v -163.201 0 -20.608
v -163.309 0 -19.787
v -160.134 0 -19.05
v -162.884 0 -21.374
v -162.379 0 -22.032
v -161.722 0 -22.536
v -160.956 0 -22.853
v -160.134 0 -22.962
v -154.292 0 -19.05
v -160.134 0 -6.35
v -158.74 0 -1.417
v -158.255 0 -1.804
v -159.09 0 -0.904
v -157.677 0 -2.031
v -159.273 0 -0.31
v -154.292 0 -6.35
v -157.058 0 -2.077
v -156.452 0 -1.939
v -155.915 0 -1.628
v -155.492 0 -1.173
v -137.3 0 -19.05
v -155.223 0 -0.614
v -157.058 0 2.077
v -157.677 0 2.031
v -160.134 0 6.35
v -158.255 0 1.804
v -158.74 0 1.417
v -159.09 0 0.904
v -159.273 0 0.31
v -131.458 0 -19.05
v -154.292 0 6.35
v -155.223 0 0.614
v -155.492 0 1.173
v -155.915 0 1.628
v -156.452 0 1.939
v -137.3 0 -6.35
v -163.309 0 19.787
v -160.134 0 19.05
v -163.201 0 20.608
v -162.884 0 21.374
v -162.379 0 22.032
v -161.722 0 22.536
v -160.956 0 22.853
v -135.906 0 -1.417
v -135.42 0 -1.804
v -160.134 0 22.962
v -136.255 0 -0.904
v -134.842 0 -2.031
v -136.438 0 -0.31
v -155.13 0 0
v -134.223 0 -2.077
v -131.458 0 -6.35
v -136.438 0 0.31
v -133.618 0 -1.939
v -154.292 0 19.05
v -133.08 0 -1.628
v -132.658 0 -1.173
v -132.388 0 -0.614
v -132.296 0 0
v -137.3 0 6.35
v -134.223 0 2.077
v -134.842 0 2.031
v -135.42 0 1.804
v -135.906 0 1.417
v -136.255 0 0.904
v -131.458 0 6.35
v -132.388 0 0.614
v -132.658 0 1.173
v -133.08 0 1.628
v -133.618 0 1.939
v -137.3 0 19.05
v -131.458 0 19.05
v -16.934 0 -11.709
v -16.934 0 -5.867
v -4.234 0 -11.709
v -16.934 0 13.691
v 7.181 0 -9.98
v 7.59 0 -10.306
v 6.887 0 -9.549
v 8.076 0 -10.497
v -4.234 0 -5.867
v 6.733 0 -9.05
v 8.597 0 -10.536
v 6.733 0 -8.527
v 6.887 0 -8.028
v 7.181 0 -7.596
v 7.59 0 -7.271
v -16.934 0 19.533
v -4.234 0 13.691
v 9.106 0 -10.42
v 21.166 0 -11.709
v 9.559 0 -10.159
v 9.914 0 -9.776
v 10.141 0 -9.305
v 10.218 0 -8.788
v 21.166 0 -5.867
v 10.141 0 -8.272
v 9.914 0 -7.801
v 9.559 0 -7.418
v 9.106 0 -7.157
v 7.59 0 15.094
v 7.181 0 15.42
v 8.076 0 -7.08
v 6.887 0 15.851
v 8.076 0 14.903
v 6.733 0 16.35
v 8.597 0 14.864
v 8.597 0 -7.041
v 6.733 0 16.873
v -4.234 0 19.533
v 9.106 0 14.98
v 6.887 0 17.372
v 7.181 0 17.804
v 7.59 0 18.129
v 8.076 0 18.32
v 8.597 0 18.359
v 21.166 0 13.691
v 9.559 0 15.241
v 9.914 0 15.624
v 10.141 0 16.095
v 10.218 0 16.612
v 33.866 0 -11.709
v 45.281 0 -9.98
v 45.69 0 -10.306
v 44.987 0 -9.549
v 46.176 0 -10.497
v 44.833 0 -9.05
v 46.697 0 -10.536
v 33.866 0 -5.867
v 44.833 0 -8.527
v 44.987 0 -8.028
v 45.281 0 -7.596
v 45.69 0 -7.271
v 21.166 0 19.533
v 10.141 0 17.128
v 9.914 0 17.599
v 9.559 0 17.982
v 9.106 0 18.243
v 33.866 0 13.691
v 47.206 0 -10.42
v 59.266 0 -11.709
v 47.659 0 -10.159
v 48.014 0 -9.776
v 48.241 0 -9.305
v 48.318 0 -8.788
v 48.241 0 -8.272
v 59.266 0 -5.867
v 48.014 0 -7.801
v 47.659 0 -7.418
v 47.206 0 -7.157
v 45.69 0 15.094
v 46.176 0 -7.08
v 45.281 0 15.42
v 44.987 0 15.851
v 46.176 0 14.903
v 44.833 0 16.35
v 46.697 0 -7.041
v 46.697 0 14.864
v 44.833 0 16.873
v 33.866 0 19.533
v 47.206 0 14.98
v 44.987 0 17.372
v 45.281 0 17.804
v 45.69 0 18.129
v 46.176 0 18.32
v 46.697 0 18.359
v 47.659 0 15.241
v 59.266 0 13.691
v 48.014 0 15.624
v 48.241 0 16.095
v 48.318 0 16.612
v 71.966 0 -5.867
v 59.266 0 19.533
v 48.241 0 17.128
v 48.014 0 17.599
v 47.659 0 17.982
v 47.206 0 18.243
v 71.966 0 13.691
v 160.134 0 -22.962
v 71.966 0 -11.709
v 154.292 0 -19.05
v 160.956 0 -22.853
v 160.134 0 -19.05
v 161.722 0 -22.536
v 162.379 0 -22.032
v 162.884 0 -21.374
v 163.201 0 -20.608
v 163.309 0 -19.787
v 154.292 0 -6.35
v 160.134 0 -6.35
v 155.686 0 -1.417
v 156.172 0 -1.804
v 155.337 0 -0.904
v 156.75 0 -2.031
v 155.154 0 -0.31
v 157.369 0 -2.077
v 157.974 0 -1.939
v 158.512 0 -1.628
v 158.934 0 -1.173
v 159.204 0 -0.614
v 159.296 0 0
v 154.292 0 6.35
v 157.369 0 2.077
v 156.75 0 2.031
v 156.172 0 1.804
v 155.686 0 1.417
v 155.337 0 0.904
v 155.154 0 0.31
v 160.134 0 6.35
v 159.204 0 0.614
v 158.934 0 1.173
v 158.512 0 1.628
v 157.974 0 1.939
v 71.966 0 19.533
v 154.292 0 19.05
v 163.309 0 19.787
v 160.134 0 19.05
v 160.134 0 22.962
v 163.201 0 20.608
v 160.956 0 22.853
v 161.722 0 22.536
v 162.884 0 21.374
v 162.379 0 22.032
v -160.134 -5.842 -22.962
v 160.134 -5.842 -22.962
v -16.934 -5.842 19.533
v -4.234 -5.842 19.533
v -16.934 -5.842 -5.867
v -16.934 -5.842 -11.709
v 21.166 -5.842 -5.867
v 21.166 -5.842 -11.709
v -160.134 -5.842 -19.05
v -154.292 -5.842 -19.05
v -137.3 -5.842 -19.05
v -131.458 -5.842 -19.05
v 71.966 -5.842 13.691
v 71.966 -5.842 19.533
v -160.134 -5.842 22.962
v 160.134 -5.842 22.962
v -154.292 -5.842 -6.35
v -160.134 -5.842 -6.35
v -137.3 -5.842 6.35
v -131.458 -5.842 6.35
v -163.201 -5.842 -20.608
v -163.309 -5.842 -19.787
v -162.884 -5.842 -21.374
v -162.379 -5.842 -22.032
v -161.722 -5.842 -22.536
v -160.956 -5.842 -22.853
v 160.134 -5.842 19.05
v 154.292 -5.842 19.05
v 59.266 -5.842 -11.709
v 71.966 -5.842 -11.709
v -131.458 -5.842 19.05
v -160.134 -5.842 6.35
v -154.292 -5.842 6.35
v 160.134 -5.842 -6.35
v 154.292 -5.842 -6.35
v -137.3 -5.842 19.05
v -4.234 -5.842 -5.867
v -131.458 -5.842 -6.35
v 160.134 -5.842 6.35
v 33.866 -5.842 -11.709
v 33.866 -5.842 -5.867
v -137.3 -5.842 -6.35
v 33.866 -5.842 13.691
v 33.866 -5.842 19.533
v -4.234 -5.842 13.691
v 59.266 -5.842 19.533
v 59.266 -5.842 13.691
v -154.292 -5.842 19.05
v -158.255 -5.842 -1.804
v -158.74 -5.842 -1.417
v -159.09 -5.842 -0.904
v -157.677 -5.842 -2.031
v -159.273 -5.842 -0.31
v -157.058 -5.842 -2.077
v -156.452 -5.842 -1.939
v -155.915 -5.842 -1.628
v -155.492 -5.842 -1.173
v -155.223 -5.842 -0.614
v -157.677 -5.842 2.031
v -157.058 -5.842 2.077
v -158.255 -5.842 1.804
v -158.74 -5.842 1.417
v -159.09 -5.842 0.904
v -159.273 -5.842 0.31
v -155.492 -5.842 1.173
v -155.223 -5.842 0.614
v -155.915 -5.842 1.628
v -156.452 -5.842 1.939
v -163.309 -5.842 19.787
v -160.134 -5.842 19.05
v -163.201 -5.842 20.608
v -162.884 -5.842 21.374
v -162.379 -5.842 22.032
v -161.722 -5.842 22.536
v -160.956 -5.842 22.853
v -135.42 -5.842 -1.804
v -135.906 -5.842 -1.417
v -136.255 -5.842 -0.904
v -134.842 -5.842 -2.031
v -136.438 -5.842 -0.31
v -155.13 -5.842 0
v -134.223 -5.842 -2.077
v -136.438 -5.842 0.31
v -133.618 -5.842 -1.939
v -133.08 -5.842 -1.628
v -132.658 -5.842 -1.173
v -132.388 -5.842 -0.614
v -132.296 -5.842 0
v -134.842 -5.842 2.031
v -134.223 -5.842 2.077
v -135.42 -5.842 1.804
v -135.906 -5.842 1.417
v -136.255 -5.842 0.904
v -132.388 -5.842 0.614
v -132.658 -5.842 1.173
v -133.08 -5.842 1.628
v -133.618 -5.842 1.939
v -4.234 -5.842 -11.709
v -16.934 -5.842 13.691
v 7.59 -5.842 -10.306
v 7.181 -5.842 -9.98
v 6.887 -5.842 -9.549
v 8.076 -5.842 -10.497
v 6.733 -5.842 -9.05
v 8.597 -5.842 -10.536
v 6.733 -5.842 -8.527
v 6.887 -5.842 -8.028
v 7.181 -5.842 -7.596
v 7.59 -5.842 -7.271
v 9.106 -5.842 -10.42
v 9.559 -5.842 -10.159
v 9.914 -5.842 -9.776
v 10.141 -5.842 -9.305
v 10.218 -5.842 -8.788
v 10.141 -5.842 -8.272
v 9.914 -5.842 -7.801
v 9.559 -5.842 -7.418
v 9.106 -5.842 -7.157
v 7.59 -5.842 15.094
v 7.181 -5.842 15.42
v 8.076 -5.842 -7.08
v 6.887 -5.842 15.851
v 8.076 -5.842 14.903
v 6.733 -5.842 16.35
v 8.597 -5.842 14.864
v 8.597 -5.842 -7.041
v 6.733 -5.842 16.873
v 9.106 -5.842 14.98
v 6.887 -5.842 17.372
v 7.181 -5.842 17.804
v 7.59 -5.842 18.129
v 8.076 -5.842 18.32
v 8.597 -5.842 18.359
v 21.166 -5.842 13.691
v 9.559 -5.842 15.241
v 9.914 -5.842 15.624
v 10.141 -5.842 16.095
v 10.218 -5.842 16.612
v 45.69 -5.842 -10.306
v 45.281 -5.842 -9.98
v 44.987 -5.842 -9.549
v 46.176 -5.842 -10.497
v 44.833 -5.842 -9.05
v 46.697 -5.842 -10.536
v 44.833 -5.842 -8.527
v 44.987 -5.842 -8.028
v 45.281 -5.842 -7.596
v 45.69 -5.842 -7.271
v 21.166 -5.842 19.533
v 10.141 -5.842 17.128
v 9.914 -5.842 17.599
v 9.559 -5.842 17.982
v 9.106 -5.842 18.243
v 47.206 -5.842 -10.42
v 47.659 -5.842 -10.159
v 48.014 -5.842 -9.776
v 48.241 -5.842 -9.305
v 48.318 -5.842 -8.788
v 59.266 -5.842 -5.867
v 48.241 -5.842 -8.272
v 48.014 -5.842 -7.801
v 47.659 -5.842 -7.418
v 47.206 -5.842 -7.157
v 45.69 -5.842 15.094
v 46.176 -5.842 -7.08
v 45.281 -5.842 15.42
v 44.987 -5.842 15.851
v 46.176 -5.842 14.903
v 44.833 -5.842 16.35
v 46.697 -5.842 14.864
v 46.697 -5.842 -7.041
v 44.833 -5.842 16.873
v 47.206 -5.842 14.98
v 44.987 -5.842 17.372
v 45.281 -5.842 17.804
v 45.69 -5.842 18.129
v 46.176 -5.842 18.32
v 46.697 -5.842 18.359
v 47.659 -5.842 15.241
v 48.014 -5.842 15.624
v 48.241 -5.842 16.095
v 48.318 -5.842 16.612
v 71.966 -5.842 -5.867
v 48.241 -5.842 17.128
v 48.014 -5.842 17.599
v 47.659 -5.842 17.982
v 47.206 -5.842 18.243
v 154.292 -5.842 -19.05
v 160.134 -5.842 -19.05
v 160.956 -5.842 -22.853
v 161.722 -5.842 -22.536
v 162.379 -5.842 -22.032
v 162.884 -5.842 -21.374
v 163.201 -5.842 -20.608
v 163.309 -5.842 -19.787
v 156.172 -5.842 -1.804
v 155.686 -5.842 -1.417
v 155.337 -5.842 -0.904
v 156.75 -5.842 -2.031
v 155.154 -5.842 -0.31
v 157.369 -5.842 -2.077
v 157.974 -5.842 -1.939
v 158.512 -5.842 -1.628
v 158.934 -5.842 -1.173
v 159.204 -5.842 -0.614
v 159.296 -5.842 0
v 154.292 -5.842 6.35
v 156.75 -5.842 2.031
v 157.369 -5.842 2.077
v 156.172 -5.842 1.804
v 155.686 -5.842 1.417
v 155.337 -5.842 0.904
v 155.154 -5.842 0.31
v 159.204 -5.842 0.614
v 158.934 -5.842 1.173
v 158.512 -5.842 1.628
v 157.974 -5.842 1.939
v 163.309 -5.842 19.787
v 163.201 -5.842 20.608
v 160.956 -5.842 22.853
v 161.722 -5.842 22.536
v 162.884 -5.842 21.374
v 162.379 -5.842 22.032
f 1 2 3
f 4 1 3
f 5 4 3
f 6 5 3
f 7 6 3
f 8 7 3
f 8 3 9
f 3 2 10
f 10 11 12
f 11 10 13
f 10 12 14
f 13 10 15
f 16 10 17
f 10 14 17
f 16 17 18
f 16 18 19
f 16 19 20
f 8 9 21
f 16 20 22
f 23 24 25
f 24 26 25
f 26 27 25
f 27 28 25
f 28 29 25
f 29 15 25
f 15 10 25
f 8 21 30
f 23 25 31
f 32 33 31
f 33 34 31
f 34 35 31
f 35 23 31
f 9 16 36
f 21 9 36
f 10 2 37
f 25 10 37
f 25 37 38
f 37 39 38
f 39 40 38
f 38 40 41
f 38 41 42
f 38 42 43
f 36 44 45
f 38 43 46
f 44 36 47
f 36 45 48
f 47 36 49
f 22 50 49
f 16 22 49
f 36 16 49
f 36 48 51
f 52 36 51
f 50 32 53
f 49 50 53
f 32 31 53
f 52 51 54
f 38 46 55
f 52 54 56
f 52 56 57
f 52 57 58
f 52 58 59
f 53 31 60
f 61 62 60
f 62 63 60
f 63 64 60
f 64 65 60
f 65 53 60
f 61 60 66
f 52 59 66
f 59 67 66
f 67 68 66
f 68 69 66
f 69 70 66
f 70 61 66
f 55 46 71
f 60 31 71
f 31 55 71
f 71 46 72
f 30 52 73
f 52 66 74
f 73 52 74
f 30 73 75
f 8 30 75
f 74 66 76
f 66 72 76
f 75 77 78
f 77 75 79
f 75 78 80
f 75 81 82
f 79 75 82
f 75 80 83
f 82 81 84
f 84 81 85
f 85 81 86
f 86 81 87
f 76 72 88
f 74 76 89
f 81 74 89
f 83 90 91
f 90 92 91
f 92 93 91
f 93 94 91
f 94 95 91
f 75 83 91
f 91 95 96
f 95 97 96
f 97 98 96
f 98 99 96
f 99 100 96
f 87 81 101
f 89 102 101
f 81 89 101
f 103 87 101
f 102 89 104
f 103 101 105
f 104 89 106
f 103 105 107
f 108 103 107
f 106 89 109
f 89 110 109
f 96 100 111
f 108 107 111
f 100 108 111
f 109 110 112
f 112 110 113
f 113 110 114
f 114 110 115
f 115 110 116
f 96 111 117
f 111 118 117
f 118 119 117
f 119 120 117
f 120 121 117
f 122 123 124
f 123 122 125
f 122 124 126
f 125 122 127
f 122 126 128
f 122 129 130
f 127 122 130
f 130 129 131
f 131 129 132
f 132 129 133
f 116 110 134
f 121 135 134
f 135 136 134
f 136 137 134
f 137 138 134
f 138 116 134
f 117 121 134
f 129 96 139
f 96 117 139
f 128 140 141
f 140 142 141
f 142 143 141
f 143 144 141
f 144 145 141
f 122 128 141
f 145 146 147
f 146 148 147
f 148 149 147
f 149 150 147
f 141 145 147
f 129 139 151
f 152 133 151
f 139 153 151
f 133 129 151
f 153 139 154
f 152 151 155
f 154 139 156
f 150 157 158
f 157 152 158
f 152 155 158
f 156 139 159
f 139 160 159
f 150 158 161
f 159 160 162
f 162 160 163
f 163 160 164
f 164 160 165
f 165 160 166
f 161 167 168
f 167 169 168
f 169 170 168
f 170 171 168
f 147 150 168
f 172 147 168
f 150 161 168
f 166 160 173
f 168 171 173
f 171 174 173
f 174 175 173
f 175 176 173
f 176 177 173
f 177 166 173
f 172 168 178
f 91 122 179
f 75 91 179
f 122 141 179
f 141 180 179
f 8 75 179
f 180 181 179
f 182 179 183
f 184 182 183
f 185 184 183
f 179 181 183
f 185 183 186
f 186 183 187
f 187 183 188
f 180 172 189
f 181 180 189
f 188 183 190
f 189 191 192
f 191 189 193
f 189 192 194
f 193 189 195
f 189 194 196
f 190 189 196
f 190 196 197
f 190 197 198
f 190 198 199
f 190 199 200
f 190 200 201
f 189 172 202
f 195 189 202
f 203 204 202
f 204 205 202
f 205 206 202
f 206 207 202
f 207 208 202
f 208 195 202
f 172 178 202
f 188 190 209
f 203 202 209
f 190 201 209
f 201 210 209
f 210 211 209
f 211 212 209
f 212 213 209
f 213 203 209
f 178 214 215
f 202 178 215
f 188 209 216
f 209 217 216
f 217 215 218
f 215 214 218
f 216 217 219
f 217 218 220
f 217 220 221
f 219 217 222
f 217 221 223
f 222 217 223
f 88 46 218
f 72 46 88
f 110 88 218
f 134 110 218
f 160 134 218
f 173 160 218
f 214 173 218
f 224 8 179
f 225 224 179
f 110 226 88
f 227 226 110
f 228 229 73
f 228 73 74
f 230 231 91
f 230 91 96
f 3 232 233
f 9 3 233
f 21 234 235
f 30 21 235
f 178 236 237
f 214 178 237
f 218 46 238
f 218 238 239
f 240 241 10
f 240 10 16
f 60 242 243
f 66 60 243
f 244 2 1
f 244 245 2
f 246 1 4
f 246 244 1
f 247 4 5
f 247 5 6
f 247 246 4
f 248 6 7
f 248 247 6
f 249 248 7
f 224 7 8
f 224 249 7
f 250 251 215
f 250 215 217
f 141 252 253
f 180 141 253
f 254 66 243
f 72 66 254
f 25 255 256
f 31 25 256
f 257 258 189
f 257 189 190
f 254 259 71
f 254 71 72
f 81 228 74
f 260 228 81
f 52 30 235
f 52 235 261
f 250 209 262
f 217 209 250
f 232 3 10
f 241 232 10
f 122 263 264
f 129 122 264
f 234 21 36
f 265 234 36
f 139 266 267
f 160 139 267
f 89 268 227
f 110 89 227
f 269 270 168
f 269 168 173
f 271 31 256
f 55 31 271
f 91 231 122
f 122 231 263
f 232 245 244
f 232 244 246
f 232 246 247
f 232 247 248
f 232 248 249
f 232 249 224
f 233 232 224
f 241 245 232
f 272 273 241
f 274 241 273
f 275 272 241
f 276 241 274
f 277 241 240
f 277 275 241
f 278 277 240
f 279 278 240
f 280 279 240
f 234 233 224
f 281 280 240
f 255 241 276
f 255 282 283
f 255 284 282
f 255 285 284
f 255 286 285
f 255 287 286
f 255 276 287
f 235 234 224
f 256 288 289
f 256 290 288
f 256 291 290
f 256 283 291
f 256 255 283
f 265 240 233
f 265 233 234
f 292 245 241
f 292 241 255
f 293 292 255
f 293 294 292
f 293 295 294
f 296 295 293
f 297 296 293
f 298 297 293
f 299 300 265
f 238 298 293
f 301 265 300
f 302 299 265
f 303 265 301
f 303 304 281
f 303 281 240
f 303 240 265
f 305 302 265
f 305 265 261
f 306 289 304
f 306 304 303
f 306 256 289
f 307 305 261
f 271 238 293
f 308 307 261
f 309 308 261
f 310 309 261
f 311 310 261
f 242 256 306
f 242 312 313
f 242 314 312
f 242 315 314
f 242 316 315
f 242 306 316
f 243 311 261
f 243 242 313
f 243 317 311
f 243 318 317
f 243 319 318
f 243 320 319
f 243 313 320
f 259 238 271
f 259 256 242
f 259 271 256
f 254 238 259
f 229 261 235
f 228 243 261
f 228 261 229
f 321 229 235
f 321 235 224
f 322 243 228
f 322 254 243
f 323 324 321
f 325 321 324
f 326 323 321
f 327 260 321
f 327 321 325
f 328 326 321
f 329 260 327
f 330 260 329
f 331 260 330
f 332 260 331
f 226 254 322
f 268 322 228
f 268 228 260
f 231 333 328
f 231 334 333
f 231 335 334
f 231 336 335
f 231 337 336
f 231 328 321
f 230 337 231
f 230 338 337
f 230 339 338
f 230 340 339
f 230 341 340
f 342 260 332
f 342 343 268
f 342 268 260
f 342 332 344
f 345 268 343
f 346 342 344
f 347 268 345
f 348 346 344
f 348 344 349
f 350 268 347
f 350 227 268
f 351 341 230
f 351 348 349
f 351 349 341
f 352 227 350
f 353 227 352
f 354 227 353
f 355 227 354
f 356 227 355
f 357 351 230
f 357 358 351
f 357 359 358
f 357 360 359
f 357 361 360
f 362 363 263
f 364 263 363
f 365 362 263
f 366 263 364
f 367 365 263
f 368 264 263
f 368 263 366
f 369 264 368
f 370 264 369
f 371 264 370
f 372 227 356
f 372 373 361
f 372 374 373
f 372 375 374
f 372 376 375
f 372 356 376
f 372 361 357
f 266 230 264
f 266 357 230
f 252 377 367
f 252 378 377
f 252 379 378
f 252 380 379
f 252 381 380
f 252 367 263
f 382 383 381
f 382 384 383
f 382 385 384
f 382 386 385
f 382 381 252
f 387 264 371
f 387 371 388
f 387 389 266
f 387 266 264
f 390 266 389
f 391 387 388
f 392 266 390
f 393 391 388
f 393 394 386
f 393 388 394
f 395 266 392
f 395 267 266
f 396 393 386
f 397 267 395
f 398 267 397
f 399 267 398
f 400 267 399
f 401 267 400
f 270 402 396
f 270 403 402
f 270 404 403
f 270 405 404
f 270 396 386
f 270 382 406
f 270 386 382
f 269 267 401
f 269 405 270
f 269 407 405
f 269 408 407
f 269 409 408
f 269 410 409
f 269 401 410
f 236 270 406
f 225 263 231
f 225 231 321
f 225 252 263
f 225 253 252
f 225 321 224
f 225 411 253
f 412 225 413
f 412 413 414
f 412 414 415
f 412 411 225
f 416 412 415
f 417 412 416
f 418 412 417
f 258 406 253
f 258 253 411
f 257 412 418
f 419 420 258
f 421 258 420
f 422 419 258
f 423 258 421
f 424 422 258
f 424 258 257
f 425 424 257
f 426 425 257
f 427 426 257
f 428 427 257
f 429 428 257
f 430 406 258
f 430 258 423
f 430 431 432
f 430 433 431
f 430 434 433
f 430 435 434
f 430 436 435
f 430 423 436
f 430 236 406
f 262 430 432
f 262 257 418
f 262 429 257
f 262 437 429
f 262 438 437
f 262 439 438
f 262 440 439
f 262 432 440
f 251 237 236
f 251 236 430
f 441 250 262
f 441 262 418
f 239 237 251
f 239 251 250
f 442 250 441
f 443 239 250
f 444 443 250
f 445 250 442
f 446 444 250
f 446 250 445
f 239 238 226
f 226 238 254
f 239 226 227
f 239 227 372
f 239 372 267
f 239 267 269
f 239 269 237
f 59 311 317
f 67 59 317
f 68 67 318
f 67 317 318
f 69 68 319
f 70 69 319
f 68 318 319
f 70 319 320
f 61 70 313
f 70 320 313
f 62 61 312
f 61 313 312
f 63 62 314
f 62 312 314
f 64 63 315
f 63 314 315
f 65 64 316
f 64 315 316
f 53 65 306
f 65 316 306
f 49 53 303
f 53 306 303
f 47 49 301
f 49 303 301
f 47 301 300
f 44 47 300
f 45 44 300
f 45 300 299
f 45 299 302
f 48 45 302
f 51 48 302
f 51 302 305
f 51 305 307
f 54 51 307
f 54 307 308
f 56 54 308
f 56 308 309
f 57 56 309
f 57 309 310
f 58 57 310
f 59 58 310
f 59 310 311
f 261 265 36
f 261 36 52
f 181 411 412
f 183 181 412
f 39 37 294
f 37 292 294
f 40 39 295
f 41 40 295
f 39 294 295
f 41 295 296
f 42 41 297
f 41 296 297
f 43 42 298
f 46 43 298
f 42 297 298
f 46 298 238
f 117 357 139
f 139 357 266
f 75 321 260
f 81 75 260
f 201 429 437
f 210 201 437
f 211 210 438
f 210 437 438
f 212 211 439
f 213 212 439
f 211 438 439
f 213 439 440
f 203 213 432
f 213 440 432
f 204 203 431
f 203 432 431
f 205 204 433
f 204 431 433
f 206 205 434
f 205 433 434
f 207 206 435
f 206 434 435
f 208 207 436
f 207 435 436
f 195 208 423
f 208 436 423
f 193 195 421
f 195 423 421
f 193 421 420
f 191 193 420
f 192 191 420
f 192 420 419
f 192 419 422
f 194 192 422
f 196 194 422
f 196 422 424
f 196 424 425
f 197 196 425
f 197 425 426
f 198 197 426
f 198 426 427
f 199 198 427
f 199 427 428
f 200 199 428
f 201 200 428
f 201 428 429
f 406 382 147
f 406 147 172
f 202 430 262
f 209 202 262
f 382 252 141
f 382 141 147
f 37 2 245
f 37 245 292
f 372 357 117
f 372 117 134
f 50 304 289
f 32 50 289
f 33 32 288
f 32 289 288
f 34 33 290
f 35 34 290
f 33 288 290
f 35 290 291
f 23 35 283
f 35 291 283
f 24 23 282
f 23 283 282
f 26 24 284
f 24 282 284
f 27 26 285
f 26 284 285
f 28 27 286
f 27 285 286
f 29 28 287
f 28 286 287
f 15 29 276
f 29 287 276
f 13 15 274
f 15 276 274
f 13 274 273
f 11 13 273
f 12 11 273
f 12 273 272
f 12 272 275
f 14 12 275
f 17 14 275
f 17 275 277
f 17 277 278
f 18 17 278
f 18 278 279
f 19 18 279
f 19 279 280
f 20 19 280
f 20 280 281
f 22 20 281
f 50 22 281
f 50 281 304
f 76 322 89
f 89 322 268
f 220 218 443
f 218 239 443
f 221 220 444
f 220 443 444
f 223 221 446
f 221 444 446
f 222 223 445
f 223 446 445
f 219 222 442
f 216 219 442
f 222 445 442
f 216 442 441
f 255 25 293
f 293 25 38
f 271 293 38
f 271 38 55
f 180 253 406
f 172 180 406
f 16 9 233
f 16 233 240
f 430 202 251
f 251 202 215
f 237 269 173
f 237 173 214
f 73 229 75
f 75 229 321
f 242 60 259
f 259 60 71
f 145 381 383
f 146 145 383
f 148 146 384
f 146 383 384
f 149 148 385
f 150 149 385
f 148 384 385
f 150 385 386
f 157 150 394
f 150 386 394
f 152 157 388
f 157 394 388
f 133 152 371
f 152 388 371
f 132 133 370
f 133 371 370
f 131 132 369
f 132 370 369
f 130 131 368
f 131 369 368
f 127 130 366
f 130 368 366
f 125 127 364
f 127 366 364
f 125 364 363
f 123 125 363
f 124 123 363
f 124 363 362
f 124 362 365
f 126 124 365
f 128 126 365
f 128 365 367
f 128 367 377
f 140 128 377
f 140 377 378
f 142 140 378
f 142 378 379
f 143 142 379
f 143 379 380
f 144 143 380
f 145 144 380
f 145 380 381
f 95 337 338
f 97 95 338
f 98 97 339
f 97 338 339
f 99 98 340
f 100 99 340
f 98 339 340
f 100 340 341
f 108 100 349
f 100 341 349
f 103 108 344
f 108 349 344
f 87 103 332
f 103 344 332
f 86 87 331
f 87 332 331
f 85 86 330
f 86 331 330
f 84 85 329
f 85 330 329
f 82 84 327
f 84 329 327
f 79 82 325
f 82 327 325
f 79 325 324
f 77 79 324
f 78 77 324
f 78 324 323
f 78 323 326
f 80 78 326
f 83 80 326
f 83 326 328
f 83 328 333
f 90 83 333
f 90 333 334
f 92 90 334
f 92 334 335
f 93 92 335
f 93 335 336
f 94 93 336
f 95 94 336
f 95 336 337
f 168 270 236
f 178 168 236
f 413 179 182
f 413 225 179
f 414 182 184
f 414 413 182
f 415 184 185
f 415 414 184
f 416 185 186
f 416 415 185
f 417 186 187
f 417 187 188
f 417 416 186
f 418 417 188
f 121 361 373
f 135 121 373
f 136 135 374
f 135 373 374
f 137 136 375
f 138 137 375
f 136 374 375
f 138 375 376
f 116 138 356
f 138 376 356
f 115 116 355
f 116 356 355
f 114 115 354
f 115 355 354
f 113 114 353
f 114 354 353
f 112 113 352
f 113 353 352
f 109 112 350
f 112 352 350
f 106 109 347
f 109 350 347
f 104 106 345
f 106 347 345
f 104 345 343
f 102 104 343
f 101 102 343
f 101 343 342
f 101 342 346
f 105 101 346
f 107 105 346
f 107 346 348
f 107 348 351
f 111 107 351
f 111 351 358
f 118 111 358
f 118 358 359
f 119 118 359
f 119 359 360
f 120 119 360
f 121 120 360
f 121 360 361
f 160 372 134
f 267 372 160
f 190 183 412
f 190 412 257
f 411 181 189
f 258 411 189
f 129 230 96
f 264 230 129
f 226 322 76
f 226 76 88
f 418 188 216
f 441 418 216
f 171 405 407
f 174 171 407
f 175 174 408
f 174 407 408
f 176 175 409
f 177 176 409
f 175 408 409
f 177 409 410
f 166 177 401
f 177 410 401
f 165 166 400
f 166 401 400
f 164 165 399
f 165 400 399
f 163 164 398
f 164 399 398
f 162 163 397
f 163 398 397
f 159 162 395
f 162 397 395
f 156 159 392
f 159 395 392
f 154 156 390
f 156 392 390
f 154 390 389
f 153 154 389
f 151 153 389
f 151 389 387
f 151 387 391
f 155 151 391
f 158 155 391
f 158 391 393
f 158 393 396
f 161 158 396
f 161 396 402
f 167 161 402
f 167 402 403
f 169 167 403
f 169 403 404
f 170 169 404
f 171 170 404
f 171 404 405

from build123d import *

# Parameters (mm, degrees)
F0_W     = 326.6186
F0_H     = 45.9232
F0_W_2   = 5.842
F0_H_2   = 12.7
F1_DEPTH = 5.842
F2_R     = 3.175
F3_R     = 2.0828
F4_DEPTH = 25.4
F5_R     = 2.0828
F6_DEPTH = 25.4
F7_W     = 12.7
F7_H     = 5.842
F7_R     = 1.7526
F8_DEPTH = 25.4


with BuildPart() as f1:
    # F0 (on Front) → F1 (new body)
    with BuildSketch(Plane.XZ):
        Rectangle(F0_W, F0_H)
        with Locations((-157.2133, -12.7)):
            Rectangle(F0_W_2, F0_H_2, mode=Mode.SUBTRACT)
        with Locations((-134.3787, -12.7)):
            Rectangle(F0_W_2, F0_H_2, mode=Mode.SUBTRACT)
        with Locations((157.2133, -12.7)):
            Rectangle(F0_W_2, F0_H_2, mode=Mode.SUBTRACT)
        with Locations((-157.2133, 12.7)):
            Rectangle(F0_W_2, F0_H_2, mode=Mode.SUBTRACT)
        with Locations((-134.3787, 12.7)):
            Rectangle(F0_W_2, F0_H_2, mode=Mode.SUBTRACT)
        with Locations((157.2133, 12.7)):
            Rectangle(F0_W_2, F0_H_2, mode=Mode.SUBTRACT)
    extrude(amount=F1_DEPTH)

    # F2
    f2_edges = [f1.edges().sort_by_distance(p)[0] for p in [
        (-163.3093, -2.921, 22.9616),
        (-163.3093, -2.921, -22.9616),
        (163.3093, -2.921, 22.9616),
        (163.3093, -2.921, -22.9616),
    ]]
    fillet(f2_edges, radius=F2_R)

    # F3 (on face) → F4 (cut)
    with BuildSketch(Plane.XZ.offset(5.842)):
        with Locations((-134.3787, 0)):
            Circle(F3_R)
        with Locations((-157.2133, 0)):
            Circle(F3_R)
    extrude(amount=-F4_DEPTH, mode=Mode.SUBTRACT)

    # F5 (on face) → F6 (cut)
    with BuildSketch(Plane.XZ.offset(5.842)):
        with Locations((157.2133, 0)):
            Circle(F5_R)
    extrude(amount=-F6_DEPTH, mode=Mode.SUBTRACT)

    # F7 (on face) → F8 (cut)
    with BuildSketch(Plane.XZ.offset(5.842)):
        with Locations((-10.58418, 16.6116)):
            Rectangle(F7_W, F7_H)
        with Locations((27.51582, 16.6116)):
            Rectangle(F7_W, F7_H)
        with Locations((65.61582, 16.6116)):
            Rectangle(F7_W, F7_H)
        with Locations((8.46582, 16.6116)):
            Circle(F7_R)
        with Locations((46.56582, 16.6116)):
            Circle(F7_R)
        with Locations((-10.58418, -8.7884)):
            Rectangle(F7_W, F7_H)
        with Locations((27.51582, -8.7884)):
            Rectangle(F7_W, F7_H)
        with Locations((65.61582, -8.7884)):
            Rectangle(F7_W, F7_H)
        with Locations((8.46582, -8.7884)):
            Circle(F7_R)
        with Locations((46.56582, -8.7884)):
            Circle(F7_R)
    extrude(amount=-F8_DEPTH, mode=Mode.SUBTRACT)


solid = f1.part
